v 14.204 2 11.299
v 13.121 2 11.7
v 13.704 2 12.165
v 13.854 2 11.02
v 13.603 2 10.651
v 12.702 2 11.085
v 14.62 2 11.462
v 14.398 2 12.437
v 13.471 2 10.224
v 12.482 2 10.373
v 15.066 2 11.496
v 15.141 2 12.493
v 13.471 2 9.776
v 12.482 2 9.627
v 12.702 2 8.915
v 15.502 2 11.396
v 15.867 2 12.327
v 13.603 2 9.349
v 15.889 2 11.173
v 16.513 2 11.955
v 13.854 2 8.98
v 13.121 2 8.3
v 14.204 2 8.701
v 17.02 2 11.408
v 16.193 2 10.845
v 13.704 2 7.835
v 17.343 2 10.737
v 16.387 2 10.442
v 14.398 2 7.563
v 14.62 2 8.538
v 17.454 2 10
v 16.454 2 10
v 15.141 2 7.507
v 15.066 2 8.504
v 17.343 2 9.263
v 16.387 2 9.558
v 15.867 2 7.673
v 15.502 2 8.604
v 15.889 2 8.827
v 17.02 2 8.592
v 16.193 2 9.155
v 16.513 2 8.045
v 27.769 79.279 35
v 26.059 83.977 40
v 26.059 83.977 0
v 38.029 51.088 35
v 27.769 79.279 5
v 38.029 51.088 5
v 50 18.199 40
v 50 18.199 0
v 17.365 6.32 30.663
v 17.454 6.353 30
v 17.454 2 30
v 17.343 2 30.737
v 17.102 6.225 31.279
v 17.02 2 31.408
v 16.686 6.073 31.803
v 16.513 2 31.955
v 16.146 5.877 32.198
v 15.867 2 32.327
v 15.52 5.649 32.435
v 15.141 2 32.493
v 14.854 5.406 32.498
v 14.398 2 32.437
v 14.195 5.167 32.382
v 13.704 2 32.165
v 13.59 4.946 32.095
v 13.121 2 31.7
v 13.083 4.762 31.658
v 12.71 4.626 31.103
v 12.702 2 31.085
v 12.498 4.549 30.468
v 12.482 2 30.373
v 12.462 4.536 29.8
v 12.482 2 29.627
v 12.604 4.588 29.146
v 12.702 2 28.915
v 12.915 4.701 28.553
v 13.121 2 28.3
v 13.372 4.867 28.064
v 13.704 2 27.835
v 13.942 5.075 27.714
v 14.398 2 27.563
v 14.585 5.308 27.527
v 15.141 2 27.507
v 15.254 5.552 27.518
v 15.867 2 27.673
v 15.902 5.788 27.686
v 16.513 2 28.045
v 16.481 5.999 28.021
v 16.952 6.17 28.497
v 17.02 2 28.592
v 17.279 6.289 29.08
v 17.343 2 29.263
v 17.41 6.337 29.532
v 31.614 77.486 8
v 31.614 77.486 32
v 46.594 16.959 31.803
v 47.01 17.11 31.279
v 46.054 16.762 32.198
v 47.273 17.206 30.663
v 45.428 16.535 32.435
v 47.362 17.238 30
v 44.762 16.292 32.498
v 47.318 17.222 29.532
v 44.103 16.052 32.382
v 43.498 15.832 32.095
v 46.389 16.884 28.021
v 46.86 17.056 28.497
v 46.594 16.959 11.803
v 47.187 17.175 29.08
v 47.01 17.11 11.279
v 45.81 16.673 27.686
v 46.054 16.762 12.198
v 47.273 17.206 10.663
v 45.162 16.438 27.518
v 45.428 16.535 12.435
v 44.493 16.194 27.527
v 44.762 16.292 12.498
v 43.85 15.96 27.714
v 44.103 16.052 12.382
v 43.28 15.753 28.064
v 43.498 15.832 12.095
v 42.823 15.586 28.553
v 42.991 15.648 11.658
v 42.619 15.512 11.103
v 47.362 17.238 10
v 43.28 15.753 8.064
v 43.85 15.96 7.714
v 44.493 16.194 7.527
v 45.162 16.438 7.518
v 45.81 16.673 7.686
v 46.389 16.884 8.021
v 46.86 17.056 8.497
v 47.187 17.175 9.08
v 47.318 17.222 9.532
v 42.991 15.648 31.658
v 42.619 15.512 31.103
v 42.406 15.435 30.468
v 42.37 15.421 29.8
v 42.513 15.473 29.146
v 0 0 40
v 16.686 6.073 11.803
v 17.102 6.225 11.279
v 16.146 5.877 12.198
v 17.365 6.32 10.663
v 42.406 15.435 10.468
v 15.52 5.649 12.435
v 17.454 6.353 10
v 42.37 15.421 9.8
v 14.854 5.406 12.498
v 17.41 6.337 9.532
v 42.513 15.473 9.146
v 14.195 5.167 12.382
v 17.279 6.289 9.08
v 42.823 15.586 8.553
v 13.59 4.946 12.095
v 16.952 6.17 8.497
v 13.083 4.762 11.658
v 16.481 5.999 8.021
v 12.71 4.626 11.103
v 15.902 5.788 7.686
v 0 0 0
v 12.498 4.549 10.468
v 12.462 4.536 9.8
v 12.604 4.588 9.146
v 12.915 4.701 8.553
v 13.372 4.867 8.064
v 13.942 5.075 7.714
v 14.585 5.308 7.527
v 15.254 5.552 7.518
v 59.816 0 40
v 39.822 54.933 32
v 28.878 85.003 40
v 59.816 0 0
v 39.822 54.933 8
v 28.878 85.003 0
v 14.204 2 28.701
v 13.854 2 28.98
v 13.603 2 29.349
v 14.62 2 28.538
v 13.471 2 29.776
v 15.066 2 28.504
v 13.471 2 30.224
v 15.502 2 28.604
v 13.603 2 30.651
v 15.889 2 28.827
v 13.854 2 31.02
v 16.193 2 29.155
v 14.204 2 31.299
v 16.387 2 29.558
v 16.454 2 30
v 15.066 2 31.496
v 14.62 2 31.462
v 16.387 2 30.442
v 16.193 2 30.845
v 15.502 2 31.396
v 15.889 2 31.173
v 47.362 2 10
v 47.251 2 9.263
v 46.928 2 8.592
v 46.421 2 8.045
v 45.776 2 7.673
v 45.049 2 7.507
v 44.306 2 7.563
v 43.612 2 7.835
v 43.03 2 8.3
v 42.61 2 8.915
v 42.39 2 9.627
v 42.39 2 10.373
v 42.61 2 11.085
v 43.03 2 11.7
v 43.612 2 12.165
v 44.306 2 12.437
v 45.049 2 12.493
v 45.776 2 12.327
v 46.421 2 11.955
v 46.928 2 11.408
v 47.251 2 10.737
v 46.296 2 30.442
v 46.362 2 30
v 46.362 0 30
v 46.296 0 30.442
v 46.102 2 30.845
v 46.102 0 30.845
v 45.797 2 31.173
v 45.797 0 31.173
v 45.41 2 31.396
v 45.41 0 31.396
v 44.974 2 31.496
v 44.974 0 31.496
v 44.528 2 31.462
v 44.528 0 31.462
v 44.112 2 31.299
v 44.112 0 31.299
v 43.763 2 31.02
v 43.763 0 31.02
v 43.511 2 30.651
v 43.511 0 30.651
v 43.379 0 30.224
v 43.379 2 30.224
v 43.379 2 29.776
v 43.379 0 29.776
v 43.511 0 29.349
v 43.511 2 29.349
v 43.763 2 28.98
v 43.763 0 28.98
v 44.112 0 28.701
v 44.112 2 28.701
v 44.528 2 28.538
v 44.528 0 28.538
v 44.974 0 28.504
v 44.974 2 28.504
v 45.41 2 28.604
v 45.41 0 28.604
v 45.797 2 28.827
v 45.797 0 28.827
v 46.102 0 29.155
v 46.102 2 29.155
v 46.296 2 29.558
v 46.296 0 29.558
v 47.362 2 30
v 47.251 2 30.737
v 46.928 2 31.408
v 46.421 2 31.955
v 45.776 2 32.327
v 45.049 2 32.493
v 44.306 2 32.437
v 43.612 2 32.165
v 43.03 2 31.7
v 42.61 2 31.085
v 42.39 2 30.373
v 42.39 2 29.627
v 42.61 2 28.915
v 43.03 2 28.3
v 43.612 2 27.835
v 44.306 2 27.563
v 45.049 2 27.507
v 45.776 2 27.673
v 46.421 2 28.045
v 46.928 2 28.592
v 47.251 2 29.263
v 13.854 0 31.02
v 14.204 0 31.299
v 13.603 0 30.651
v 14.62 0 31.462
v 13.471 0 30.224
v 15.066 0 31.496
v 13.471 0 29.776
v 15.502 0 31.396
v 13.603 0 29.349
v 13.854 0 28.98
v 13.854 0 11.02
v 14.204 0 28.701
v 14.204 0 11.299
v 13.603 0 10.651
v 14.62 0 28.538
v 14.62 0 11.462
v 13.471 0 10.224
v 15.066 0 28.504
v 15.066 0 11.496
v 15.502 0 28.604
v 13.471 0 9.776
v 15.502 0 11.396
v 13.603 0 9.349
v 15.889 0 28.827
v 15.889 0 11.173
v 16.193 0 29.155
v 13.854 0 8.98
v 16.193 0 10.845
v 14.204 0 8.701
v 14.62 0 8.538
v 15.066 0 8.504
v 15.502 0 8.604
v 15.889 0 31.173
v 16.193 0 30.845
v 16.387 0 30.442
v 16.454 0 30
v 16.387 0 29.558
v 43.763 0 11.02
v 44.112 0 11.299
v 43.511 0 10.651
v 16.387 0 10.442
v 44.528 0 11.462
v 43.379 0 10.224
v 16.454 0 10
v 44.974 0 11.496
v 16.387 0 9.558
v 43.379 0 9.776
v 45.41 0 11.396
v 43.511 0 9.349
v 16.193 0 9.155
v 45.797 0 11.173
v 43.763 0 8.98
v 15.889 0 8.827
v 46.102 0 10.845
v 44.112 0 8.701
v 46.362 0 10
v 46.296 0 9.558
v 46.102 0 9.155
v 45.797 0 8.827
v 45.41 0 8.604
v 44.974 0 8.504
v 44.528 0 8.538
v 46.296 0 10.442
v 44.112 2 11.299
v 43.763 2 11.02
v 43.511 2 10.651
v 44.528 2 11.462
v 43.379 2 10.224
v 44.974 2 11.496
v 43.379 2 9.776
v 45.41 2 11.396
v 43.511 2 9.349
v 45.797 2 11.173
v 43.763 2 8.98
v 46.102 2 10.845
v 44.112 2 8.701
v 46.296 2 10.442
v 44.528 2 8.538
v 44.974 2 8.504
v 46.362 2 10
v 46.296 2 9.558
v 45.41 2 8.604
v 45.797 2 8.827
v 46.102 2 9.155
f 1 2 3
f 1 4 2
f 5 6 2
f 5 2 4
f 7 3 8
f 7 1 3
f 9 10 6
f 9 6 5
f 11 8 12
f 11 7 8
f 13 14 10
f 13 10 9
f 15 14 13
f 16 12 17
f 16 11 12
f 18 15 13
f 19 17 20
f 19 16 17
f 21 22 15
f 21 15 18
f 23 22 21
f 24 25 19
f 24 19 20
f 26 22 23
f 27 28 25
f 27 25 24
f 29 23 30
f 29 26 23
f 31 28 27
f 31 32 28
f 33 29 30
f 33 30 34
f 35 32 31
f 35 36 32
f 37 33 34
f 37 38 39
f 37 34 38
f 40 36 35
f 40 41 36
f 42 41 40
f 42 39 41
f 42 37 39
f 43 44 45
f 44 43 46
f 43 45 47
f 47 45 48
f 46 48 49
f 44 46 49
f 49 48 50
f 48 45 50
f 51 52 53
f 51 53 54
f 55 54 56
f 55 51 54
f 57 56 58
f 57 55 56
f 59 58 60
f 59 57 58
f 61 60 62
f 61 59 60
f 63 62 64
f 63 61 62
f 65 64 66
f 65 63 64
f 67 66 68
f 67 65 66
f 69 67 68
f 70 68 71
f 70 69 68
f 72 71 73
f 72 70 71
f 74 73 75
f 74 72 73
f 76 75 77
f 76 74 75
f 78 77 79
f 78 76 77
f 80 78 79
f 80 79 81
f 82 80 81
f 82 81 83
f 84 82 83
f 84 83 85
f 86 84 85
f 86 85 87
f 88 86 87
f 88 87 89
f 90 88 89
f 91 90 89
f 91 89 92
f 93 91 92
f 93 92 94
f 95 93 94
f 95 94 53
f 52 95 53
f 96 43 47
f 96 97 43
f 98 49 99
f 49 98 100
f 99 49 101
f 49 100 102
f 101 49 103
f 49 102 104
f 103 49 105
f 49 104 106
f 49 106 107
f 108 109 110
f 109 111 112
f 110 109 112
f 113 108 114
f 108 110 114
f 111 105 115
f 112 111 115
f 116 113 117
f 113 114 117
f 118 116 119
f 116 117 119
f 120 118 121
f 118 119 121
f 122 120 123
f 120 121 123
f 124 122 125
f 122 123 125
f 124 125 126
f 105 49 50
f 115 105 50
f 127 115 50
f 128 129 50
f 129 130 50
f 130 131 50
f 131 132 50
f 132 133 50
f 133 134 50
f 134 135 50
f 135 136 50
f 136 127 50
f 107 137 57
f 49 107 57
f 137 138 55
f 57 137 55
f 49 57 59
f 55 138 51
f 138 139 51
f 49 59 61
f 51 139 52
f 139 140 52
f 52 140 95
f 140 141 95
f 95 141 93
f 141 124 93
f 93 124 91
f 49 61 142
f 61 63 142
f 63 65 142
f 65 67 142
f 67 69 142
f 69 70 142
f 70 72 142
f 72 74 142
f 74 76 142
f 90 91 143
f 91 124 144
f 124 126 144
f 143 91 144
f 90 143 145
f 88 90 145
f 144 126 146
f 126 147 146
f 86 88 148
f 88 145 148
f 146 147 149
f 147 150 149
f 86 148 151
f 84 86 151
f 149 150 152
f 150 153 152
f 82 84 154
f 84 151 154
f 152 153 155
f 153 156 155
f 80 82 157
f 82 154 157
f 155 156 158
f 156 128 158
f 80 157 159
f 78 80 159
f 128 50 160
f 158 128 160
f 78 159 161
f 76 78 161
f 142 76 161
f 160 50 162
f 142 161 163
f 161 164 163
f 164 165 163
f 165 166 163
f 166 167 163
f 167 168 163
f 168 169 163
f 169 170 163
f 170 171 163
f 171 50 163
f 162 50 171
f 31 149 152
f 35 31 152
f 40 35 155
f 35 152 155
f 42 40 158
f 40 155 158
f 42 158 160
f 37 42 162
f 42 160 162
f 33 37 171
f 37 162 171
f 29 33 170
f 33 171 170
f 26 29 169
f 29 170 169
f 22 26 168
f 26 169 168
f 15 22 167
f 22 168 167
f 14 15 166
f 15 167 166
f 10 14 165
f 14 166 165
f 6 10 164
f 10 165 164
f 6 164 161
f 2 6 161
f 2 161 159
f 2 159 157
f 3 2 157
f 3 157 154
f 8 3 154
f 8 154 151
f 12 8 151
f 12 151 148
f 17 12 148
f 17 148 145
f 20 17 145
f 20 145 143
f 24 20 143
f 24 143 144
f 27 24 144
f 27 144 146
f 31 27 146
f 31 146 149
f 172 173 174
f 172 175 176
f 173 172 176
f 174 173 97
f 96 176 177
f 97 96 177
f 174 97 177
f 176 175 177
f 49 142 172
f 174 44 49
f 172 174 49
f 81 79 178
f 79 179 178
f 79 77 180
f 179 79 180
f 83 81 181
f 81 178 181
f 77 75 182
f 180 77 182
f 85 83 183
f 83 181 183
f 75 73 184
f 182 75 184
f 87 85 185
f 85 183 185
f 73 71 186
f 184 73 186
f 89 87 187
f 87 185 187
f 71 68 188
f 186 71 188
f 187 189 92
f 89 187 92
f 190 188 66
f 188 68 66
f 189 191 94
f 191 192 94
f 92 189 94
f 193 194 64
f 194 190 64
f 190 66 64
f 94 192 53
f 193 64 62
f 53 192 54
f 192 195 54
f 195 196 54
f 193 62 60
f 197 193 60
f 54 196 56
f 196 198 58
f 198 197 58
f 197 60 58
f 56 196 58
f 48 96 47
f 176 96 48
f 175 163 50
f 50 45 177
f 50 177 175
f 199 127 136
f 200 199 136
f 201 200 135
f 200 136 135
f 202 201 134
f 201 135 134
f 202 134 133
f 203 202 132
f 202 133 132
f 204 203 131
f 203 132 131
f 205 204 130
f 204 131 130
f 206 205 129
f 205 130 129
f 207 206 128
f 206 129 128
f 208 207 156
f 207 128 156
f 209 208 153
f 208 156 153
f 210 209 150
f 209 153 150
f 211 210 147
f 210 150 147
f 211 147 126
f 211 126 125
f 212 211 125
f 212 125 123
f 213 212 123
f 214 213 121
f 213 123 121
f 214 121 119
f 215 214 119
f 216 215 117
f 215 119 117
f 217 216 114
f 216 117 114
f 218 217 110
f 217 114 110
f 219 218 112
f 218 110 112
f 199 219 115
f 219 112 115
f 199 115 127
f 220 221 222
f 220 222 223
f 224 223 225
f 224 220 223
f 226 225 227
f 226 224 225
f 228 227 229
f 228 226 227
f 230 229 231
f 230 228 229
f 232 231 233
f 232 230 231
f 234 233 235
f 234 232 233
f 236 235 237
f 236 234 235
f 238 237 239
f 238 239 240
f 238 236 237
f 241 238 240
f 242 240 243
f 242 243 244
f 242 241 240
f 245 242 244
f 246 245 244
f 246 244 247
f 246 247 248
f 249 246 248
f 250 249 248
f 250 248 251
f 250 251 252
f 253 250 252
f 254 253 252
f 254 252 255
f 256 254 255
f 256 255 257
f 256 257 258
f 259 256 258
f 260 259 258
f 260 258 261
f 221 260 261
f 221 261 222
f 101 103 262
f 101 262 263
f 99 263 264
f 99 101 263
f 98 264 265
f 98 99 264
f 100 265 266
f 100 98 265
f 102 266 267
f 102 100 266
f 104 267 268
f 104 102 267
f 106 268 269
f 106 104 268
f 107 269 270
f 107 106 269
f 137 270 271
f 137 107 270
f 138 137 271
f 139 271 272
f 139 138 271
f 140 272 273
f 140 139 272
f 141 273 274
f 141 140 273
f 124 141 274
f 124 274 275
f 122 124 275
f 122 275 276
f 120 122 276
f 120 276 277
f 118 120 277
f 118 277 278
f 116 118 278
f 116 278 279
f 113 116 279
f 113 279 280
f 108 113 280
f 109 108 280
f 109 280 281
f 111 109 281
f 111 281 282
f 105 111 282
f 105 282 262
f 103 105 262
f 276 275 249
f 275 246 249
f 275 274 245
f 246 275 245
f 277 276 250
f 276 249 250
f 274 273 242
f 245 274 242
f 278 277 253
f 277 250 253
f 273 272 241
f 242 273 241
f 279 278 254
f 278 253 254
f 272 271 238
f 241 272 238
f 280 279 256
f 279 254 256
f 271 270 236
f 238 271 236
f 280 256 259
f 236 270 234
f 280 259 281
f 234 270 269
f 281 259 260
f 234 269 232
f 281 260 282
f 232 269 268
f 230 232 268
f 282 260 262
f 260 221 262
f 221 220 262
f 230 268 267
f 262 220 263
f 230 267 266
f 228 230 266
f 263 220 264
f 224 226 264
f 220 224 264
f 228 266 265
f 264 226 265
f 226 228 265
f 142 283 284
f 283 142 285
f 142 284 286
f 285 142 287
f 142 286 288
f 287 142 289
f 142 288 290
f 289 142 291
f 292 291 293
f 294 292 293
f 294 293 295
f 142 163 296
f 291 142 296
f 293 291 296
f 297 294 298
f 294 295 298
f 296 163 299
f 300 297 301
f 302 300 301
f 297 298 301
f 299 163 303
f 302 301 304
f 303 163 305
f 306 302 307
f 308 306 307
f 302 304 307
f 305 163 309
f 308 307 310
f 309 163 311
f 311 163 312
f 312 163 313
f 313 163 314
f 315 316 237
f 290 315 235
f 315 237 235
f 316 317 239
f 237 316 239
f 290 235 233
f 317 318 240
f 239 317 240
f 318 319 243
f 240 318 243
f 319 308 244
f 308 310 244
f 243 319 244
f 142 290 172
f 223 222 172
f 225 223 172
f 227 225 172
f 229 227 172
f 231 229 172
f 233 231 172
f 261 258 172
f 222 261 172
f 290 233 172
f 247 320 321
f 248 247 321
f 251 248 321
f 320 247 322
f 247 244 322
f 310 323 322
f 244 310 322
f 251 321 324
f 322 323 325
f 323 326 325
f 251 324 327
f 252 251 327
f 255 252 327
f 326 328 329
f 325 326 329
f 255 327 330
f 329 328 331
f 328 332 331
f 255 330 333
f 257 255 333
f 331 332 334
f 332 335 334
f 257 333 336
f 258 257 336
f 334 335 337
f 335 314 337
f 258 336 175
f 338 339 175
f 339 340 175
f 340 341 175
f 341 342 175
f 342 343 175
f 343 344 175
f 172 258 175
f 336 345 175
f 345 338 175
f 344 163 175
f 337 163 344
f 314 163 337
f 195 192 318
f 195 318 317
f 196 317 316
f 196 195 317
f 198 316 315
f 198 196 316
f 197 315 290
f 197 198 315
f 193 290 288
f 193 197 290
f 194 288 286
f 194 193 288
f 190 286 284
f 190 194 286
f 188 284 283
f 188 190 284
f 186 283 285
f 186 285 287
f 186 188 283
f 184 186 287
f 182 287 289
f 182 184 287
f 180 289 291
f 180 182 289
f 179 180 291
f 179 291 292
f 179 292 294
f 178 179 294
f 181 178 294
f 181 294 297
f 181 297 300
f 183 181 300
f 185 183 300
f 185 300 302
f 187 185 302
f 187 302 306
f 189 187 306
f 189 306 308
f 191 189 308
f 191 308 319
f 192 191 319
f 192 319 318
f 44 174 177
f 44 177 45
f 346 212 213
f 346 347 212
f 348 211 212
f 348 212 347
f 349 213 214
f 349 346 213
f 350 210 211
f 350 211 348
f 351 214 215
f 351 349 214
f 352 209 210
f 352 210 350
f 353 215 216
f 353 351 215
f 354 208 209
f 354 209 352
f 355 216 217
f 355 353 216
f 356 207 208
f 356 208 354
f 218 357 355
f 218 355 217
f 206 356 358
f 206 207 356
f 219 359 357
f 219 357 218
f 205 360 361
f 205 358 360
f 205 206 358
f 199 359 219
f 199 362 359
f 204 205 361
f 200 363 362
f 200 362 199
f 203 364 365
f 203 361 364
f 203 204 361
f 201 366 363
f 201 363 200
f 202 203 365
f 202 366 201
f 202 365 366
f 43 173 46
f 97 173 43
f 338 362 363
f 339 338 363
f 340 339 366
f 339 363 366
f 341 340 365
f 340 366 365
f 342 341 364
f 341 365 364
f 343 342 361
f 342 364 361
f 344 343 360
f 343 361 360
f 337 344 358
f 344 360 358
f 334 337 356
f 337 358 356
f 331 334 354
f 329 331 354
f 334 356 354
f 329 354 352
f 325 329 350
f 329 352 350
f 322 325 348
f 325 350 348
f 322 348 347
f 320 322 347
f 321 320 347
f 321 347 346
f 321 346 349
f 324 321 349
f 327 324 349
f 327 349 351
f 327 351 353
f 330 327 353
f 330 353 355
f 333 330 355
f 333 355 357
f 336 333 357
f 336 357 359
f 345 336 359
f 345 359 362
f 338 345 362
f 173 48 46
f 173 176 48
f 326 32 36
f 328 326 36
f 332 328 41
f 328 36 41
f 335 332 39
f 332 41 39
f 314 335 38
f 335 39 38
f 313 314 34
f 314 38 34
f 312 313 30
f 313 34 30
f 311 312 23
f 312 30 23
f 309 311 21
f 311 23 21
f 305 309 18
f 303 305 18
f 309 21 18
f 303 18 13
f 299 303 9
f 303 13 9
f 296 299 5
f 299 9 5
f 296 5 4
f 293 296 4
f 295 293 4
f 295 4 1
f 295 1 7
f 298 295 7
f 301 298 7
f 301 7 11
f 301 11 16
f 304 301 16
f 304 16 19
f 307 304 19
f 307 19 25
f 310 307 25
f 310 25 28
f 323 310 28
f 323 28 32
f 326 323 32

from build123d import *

# Parameters (mm, degrees)
BOSS_EXTRUDE1_DEPTH = 40
CUT_EXTRUDE1_REACH  = 113.371
SKETCH2_R           = 1.5
CUT_EXTRUDE3_REACH  = 115.371
CUT_EXTRUDE3_START  = -2
SKETCH2_4_R         = 2.5
SKETCH2_4_R_2       = 1.5


with BuildPart() as part:
    # Sketch1 → Boss-Extrude1 (new body)
    with BuildSketch(Plane.XY):
        Polygon((50, 18.198511713), (0, 0), (59.816249889, 0), (28.87766783, 85.003055598), (26.058589967, 83.976995168), align=None)
    extrude(amount=BOSS_EXTRUDE1_DEPTH)

    # Sketch2 → Cut-Extrude1 (cut, up to next)
    with BuildSketch(Plane.XZ, mode=Mode.PRIVATE) as cut_extrude1_sk1:
        with Locations((14.954062472, 30)):
            Circle(SKETCH2_R)
    cut_extrude1_tool1 = extrude(cut_extrude1_sk1.sketch, amount=-CUT_EXTRUDE1_REACH, mode=Mode.PRIVATE) & part.part
    # Sketch2 → Cut-Extrude1 (cut, up to next)
    with BuildSketch(Plane.XZ, mode=Mode.PRIVATE) as cut_extrude1_sk2:
        with Locations((44.862187417, 30)):
            Circle(SKETCH2_R)
    cut_extrude1_tool2 = extrude(cut_extrude1_sk2.sketch, amount=-CUT_EXTRUDE1_REACH, mode=Mode.PRIVATE) & part.part
    cut_extrude1_1 = cut_extrude1_tool1.solids().sort_by_distance((14.954062, 0, 30))[0]
    add(cut_extrude1_1, mode=Mode.SUBTRACT)
    cut_extrude1_2 = cut_extrude1_tool2.solids().sort_by_distance((44.862187, 0, 30))[0]
    add(cut_extrude1_2, mode=Mode.SUBTRACT)
    cut_extrude1 = cut_extrude1_1 + cut_extrude1_2  # Cut-Extrude1 as one shape, for the pattern or mirror that repeats it

    # Sketch2<4> → Cut-Extrude3 (cut, up to next)
    with BuildSketch(Plane.XZ.offset(CUT_EXTRUDE3_START), mode=Mode.PRIVATE) as cut_extrude3_sk1:
        with Locations((14.954062472, 30)):
            Circle(SKETCH2_4_R)
        with Locations((14.954062472, 30)):
            Circle(SKETCH2_4_R_2, mode=Mode.SUBTRACT)
    cut_extrude3_tool1 = extrude(cut_extrude3_sk1.sketch, amount=-CUT_EXTRUDE3_REACH, mode=Mode.PRIVATE) & part.part
    # Sketch2<4> → Cut-Extrude3 (cut, up to next)
    with BuildSketch(Plane.XZ.offset(CUT_EXTRUDE3_START), mode=Mode.PRIVATE) as cut_extrude3_sk2:
        with Locations((44.862187417, 30)):
            Circle(SKETCH2_4_R)
    cut_extrude3_tool2 = extrude(cut_extrude3_sk2.sketch, amount=-CUT_EXTRUDE3_REACH, mode=Mode.PRIVATE) & part.part
    cut_extrude3_1 = cut_extrude3_tool1.solids().sort_by_distance((12.524773, 2, 30))[0]
    add(cut_extrude3_1, mode=Mode.SUBTRACT)
    cut_extrude3_2 = cut_extrude3_tool2.solids().sort_by_distance((44.862187, 2, 30))[0]
    add(cut_extrude3_2, mode=Mode.SUBTRACT)
    cut_extrude3 = cut_extrude3_1 + cut_extrude3_2  # Cut-Extrude3 as one shape, for the pattern or mirror that repeats it

    # Mirror1: Cut-Extrude1, Cut-Extrude3 across plane
    add(cut_extrude1.mirror(Plane.XY.offset(20)), mode=Mode.SUBTRACT)
    add(cut_extrude3.mirror(Plane.XY.offset(20)), mode=Mode.SUBTRACT)

    # Sketch3 → Cut-Loft1 section 0
    with BuildSketch(Plane(origin=(50, 18.198511713, 0), x_dir=(0, 0, 1), z_dir=(-0.9396926207859103, -0.3420201433256634, 0))):
        with BuildLine():
            Line((5, 65), (35, 65))
            Line((35, 65), (35, 35))
            Line((35, 35), (5, 35))
            Line((5, 35), (5, 65))
        make_face()
    # Sketch4 → Cut-Loft1 section 1
    with BuildSketch(Plane(origin=(52.819077862, 19.224572143, 0), x_dir=(0, 0, -1), z_dir=(0.9396926207859103, 0.3420201433256634, 0))):
        with BuildLine():
            Line((-8, 62), (-32, 62))
            Line((-32, 62), (-32, 38))
            Line((-32, 38), (-8, 38))
            Line((-8, 38), (-8, 62))
        make_face()
    loft(mode=Mode.SUBTRACT)


solid = part.part
